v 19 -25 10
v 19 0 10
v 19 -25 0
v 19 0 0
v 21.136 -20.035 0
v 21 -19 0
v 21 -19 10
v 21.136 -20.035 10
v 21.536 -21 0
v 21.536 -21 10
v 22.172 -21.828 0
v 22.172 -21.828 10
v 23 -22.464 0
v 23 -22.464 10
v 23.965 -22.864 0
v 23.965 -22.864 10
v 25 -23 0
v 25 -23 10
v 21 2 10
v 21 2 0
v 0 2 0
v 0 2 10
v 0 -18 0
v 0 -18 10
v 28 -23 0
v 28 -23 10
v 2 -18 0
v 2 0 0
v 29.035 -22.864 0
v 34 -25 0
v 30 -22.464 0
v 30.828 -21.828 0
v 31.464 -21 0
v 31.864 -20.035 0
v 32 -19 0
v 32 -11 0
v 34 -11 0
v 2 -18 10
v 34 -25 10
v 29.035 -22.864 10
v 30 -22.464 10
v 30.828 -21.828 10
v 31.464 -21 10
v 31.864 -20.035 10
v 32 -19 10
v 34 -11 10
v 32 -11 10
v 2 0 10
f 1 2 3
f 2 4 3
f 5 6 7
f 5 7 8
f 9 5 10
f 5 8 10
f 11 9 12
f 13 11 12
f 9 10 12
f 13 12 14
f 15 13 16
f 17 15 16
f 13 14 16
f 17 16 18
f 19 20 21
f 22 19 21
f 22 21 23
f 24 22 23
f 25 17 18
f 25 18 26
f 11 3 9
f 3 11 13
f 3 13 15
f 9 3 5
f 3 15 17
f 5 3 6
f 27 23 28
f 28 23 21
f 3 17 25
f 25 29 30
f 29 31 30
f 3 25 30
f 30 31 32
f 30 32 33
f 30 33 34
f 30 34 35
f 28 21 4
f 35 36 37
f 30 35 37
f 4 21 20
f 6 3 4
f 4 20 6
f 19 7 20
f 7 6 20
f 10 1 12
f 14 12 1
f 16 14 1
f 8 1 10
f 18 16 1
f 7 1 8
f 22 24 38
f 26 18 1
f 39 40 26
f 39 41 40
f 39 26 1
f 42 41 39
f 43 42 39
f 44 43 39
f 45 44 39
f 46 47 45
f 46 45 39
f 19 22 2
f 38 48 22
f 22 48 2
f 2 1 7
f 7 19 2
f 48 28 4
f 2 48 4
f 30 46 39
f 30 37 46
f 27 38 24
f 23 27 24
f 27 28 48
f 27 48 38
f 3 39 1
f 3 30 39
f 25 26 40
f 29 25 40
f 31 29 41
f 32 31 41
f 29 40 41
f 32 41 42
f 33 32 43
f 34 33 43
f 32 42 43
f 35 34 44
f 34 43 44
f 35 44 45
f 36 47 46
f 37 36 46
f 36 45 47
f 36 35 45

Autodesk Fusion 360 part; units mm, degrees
sketch "Sketch1" plane through (0, 0, 0) normal (0, 0, 1) x (1, 0, 0)
  line L0 (0, 0) -> (21, 0)
  line L1 (21, 0) -> (21, 2)
  line L2 (21, 2) -> (0, 2)
  line L3 (0, 2) -> (0, 0)
  line L4 (0, 2) -> (2, 2)
  line L5 (2, 2) -> (2, -18)
  line L6 (2, -18) -> (0, -18)
  line L7 (0, -18) -> (0, 2)
  line L8 (21, 2) -> (19, 2)
  line L9 (19, 2) -> (19, -23)
  line L10 (19, -23) -> (21, -23)
  line L11 (21, -23) -> (21, 2)
  line L12 (19, -23) -> (34, -23)
  line L13 (34, -23) -> (34, -25)
  line L14 (34, -25) -> (19, -25)
  line L15 (19, -25) -> (19, -23)
  line L16 (34, -23) -> (32, -23)
  line L17 (32, -23) -> (32, -11)
  line L18 (32, -11) -> (34, -11)
  line L19 (34, -11) -> (34, -23)
  dimension "d1" = 21
  dimension "d2" = 2
  dimension "d3" = 2
  dimension "d4" = 20
  dimension "d5" = 2
  dimension "d6" = 25
  dimension "d7" = 15
  dimension "d8" = 2
  dimension "d9" = 2
  dimension "d10" = 12
extrude "Extrude1" add sketch "Sketch1" along normal blind 10
fillet "Fillet1" radius 4 2 edges at (21, -23, 5) (32, -23, 5)
